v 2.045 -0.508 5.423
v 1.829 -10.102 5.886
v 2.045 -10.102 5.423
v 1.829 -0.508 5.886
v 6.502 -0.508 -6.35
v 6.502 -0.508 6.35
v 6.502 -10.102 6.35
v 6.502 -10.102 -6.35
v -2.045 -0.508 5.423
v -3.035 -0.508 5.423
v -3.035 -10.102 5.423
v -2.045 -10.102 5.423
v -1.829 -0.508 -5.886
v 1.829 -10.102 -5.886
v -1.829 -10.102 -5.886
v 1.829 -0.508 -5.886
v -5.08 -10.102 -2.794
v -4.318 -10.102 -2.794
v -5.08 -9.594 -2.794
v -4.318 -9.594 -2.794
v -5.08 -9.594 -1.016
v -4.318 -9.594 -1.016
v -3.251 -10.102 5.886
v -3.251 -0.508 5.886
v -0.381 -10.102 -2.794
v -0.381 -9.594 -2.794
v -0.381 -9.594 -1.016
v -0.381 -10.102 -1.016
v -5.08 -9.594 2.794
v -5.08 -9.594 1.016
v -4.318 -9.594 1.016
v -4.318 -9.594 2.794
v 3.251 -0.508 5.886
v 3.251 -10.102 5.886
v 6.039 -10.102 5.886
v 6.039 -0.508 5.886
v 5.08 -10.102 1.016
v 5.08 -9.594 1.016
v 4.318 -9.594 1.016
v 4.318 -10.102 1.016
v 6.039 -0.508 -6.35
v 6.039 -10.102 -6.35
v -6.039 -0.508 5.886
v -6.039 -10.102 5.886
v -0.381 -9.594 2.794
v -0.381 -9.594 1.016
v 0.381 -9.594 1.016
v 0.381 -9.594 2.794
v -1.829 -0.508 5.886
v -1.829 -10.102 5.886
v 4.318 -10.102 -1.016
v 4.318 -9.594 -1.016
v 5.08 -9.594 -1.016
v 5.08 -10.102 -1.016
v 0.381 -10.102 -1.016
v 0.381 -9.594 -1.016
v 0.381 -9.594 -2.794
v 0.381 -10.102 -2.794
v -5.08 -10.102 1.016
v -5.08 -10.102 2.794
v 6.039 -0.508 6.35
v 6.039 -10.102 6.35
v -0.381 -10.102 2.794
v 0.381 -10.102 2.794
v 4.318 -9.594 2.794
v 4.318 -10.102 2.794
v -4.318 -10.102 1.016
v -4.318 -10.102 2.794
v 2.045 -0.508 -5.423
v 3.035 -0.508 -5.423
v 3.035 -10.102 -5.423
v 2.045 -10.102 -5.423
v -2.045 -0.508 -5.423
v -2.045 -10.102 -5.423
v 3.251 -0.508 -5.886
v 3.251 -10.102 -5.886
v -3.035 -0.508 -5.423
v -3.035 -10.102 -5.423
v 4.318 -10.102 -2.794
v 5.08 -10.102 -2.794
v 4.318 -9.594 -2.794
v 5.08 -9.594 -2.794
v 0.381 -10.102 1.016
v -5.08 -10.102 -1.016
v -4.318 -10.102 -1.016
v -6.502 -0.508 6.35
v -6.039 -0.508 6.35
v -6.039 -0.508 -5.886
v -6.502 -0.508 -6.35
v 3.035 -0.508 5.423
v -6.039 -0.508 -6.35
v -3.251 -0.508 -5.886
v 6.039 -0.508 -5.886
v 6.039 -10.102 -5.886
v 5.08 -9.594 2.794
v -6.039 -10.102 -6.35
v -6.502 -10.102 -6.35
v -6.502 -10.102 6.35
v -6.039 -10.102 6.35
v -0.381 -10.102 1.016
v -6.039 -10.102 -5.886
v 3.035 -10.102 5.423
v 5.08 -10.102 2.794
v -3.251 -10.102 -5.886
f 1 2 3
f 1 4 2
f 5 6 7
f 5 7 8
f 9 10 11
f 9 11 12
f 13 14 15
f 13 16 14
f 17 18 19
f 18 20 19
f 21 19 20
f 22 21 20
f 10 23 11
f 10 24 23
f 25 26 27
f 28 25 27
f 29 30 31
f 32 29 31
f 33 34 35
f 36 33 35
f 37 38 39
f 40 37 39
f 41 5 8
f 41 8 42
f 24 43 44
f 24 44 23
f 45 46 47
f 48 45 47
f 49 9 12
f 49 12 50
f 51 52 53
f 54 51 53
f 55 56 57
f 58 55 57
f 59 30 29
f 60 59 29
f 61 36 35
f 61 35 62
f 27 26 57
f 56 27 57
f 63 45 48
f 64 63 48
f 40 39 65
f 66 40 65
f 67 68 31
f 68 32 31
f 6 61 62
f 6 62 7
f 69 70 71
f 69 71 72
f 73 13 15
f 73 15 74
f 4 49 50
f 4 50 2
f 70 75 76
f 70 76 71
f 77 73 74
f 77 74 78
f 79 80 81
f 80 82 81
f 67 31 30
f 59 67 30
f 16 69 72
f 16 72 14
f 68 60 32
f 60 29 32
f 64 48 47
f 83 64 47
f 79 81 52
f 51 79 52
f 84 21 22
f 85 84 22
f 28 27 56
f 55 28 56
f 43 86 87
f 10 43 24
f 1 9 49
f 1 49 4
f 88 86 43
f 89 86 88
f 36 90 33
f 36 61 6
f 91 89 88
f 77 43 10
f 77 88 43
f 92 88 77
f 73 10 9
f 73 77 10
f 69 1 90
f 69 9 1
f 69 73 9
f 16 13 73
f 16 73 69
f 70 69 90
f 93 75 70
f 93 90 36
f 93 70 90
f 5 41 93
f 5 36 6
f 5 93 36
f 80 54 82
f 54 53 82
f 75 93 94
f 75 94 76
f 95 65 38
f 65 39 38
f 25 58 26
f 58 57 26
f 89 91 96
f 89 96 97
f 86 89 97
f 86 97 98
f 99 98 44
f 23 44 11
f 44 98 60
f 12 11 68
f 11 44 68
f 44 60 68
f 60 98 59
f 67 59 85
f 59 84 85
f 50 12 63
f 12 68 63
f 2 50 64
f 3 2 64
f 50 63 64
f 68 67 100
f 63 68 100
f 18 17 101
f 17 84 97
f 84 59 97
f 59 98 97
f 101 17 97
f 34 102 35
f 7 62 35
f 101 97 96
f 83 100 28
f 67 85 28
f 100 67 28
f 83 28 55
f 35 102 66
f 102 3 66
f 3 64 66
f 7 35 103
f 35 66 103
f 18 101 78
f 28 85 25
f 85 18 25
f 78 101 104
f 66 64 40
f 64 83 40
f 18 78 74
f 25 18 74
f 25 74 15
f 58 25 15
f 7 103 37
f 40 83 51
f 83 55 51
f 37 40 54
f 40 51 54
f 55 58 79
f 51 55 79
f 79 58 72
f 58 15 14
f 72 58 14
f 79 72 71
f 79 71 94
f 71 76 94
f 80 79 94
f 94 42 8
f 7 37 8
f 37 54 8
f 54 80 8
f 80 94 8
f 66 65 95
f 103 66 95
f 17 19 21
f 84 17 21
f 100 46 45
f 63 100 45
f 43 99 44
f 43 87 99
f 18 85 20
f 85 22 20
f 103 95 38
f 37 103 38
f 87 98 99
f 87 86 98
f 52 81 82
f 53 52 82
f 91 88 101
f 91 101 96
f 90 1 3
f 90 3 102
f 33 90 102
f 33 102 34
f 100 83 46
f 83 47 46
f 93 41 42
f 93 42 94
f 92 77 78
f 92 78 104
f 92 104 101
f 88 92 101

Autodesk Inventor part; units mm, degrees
sketch "Sketch_2" plane through (0, -0.254, 0) normal (0, 1, 0) x (1, 0, 0)
  line L0 (-6.5024, -6.35) -> (-6.0389, -6.35)
  line L1 (-6.0389, -6.35) -> (-6.0389, -5.8865)
  line L2 (-6.0389, -5.8865) -> (-3.2509, -5.8865)
  line L3 (-3.2509, -5.8865) -> (-3.0348, -5.4229)
  line L4 (-3.0348, -5.4229) -> (-2.0452, -5.4229)
  line L5 (-2.0452, -5.4229) -> (-1.8291, -5.8865)
  line L6 (-1.8291, -5.8865) -> (1.8291, -5.8865)
  line L7 (1.8291, -5.8865) -> (2.0452, -5.4229)
  line L8 (2.0452, -5.4229) -> (3.0348, -5.4229)
  line L9 (3.0348, -5.4229) -> (3.2509, -5.8865)
  line L10 (3.2509, -5.8865) -> (6.0389, -5.8865)
  line L11 (6.0389, -5.8865) -> (6.0389, -6.35)
  line L12 (6.0389, -6.35) -> (6.5024, -6.35)
  line L13 (6.5024, -6.35) -> (6.5024, 6.35)
  line L14 (6.5024, 6.35) -> (6.0389, 6.35)
  line L15 (6.0389, 6.35) -> (6.0389, 5.8865)
  line L16 (6.0389, 5.8865) -> (3.2509, 5.8865)
  line L17 (3.2509, 5.8865) -> (3.0348, 5.4229)
  line L18 (3.0348, 5.4229) -> (2.0452, 5.4229)
  line L19 (2.0452, 5.4229) -> (1.8291, 5.8865)
  line L20 (1.8291, 5.8865) -> (-1.8291, 5.8865)
  line L21 (-1.8291, 5.8865) -> (-2.0452, 5.4229)
  line L22 (-2.0452, 5.4229) -> (-3.0348, 5.4229)
  line L23 (-3.0348, 5.4229) -> (-3.2509, 5.8865)
  line L24 (-3.2509, 5.8865) -> (-6.0389, 5.8865)
  line L25 (-6.0389, 5.8865) -> (-6.0389, 6.35)
  line L26 (-6.0389, 6.35) -> (-6.5024, 6.35)
  line L27 (-6.5024, 6.35) -> (-6.5024, -6.35)
extrude "Extrusion1" add sketch "Sketch_2" against normal blind 9.8476
sketch "Sketch_8" plane through (0, -9.5936, 0) normal (0, 1, 0) x (1, 0, 0)
  line L0 (-5.08, -2.794) -> (-4.318, -2.794)
  line L1 (-4.318, -2.794) -> (-4.318, -1.016)
  line L2 (-4.318, -1.016) -> (-5.08, -1.016)
  line L3 (-5.08, -1.016) -> (-5.08, -2.794)
extrude "Extrusion2" cut sketch "Sketch_8" against normal blind 25.4
sketch "Sketch_5" plane through (0, -9.5936, 0) normal (0, 1, 0) x (1, 0, 0)
  line L0 (-0.381, -2.794) -> (0.381, -2.794)
  line L1 (0.381, -2.794) -> (0.381, -1.016)
  line L2 (0.381, -1.016) -> (-0.381, -1.016)
  line L3 (-0.381, -1.016) -> (-0.381, -2.794)
extrude "Extrusion3" cut sketch "Sketch_5" against normal blind 25.4
sketch "Sketch_9" plane through (0, -9.5936, 0) normal (0, 1, 0) x (1, 0, 0)
  line L0 (4.318, -2.794) -> (5.08, -2.794)
  line L1 (5.08, -2.794) -> (5.08, -1.016)
  line L2 (5.08, -1.016) -> (4.318, -1.016)
  line L3 (4.318, -1.016) -> (4.318, -2.794)
extrude "Extrusion4" cut sketch "Sketch_9" against normal blind 25.4
sketch "Sketch_10" plane through (0, -9.5936, 0) normal (0, 1, 0) x (1, 0, 0)
  line L0 (-5.08, 1.016) -> (-4.318, 1.016)
  line L1 (-4.318, 1.016) -> (-4.318, 2.794)
  line L2 (-4.318, 2.794) -> (-5.08, 2.794)
  line L3 (-5.08, 2.794) -> (-5.08, 1.016)
extrude "Extrusion5" cut sketch "Sketch_10" against normal blind 25.4
sketch "Sketch_11" plane through (0, -9.5936, 0) normal (0, 1, 0) x (1, 0, 0)
  line L0 (-0.381, 1.016) -> (0.381, 1.016)
  line L1 (0.381, 1.016) -> (0.381, 2.794)
  line L2 (0.381, 2.794) -> (-0.381, 2.794)
  line L3 (-0.381, 2.794) -> (-0.381, 1.016)
extrude "Extrusion6" cut sketch "Sketch_11" against normal blind 25.4
sketch "Sketch_12" plane through (0, -9.5936, 0) normal (0, 1, 0) x (1, 0, 0)
  line L0 (4.318, 1.016) -> (5.08, 1.016)
  line L1 (5.08, 1.016) -> (5.08, 2.794)
  line L2 (5.08, 2.794) -> (4.318, 2.794)
  line L3 (4.318, 2.794) -> (4.318, 1.016)
extrude "Extrusion7" cut sketch "Sketch_12" against normal blind 25.4
sketch "Sketch_19" plane through (0, -0.254, 0) normal (0, 1, 0) x (1, 0, 0)
  line L0 (-6.5024, -6.35) -> (-6.0389, -6.35)
  line L1 (-6.0389, -6.35) -> (-6.0389, -5.8865)
  line L2 (-6.0389, -5.8865) -> (-3.2509, -5.8865)
  line L3 (-3.2509, -5.8865) -> (-3.0348, -5.4229)
  line L4 (-3.0348, -5.4229) -> (-2.0452, -5.4229)
  line L5 (-2.0452, -5.4229) -> (-1.8291, -5.8865)
  line L6 (-1.8291, -5.8865) -> (1.8291, -5.8865)
  line L7 (1.8291, -5.8865) -> (2.0452, -5.4229)
  line L8 (2.0452, -5.4229) -> (3.0348, -5.4229)
  line L9 (3.0348, -5.4229) -> (3.2509, -5.8865)
  line L10 (3.2509, -5.8865) -> (6.0389, -5.8865)
  line L11 (6.0389, -5.8865) -> (6.0389, -6.35)
  line L12 (6.0389, -6.35) -> (6.5024, -6.35)
  line L13 (6.5024, -6.35) -> (6.5024, 6.35)
  line L14 (6.5024, 6.35) -> (6.0389, 6.35)
  line L15 (6.0389, 6.35) -> (6.0389, 5.8865)
  line L16 (6.0389, 5.8865) -> (3.2509, 5.8865)
  line L17 (3.2509, 5.8865) -> (3.0348, 5.4229)
  line L18 (3.0348, 5.4229) -> (2.0452, 5.4229)
  line L19 (2.0452, 5.4229) -> (1.8291, 5.8865)
  line L20 (1.8291, 5.8865) -> (-1.8291, 5.8865)
  line L21 (-1.8291, 5.8865) -> (-2.0452, 5.4229)
  line L22 (-2.0452, 5.4229) -> (-3.0348, 5.4229)
  line L23 (-3.0348, 5.4229) -> (-3.2509, 5.8865)
  line L24 (-3.2509, 5.8865) -> (-6.0389, 5.8865)
  line L25 (-6.0389, 5.8865) -> (-6.0389, 6.35)
  line L26 (-6.0389, 6.35) -> (-6.5024, 6.35)
  line L27 (-6.5024, 6.35) -> (-6.5024, -6.35)
extrude "Extrusion8" cut sketch "Sketch_19" against normal blind 0.254
ref_plane "rot_XY" through (0, 6.6675, 0) normal (0, 0, 1) x (1, 0, 0)
ref_plane "rot_YZ" through (0, 6.6675, 0) normal (1, 0, 0) x (0, 1, 0)
ref_plane "rot_ZX" through (0, 6.6675, 0) normal (0, 1, 0) x (0, 0, 1)
ref_plane "to_cover_XY" through (0, -0.254, 0) normal (0, 1, 0) x (1, 0, 0)
ref_plane "to_cover_YZ" through (0, -0.254, 0) normal (1, 0, 0) x (0, 0, -1)
ref_plane "to_cover_ZX" through (0, -0.254, 0) normal (0, 0, -1) x (0, 1, 0)
ref_plane "to_terminals_XY" through (0, -9.5936, 0) normal (0, -1, 0) x (1, 0, 0)
ref_plane "to_terminals_YZ" through (0, -9.5936, 0) normal (1, 0, 0) x (0, 0, 1)
ref_plane "to_terminals_ZX" through (0, -9.5936, 0) normal (0, 0, 1) x (0, -1, 0)
properties part number "M20_ang2830TX-switch"
